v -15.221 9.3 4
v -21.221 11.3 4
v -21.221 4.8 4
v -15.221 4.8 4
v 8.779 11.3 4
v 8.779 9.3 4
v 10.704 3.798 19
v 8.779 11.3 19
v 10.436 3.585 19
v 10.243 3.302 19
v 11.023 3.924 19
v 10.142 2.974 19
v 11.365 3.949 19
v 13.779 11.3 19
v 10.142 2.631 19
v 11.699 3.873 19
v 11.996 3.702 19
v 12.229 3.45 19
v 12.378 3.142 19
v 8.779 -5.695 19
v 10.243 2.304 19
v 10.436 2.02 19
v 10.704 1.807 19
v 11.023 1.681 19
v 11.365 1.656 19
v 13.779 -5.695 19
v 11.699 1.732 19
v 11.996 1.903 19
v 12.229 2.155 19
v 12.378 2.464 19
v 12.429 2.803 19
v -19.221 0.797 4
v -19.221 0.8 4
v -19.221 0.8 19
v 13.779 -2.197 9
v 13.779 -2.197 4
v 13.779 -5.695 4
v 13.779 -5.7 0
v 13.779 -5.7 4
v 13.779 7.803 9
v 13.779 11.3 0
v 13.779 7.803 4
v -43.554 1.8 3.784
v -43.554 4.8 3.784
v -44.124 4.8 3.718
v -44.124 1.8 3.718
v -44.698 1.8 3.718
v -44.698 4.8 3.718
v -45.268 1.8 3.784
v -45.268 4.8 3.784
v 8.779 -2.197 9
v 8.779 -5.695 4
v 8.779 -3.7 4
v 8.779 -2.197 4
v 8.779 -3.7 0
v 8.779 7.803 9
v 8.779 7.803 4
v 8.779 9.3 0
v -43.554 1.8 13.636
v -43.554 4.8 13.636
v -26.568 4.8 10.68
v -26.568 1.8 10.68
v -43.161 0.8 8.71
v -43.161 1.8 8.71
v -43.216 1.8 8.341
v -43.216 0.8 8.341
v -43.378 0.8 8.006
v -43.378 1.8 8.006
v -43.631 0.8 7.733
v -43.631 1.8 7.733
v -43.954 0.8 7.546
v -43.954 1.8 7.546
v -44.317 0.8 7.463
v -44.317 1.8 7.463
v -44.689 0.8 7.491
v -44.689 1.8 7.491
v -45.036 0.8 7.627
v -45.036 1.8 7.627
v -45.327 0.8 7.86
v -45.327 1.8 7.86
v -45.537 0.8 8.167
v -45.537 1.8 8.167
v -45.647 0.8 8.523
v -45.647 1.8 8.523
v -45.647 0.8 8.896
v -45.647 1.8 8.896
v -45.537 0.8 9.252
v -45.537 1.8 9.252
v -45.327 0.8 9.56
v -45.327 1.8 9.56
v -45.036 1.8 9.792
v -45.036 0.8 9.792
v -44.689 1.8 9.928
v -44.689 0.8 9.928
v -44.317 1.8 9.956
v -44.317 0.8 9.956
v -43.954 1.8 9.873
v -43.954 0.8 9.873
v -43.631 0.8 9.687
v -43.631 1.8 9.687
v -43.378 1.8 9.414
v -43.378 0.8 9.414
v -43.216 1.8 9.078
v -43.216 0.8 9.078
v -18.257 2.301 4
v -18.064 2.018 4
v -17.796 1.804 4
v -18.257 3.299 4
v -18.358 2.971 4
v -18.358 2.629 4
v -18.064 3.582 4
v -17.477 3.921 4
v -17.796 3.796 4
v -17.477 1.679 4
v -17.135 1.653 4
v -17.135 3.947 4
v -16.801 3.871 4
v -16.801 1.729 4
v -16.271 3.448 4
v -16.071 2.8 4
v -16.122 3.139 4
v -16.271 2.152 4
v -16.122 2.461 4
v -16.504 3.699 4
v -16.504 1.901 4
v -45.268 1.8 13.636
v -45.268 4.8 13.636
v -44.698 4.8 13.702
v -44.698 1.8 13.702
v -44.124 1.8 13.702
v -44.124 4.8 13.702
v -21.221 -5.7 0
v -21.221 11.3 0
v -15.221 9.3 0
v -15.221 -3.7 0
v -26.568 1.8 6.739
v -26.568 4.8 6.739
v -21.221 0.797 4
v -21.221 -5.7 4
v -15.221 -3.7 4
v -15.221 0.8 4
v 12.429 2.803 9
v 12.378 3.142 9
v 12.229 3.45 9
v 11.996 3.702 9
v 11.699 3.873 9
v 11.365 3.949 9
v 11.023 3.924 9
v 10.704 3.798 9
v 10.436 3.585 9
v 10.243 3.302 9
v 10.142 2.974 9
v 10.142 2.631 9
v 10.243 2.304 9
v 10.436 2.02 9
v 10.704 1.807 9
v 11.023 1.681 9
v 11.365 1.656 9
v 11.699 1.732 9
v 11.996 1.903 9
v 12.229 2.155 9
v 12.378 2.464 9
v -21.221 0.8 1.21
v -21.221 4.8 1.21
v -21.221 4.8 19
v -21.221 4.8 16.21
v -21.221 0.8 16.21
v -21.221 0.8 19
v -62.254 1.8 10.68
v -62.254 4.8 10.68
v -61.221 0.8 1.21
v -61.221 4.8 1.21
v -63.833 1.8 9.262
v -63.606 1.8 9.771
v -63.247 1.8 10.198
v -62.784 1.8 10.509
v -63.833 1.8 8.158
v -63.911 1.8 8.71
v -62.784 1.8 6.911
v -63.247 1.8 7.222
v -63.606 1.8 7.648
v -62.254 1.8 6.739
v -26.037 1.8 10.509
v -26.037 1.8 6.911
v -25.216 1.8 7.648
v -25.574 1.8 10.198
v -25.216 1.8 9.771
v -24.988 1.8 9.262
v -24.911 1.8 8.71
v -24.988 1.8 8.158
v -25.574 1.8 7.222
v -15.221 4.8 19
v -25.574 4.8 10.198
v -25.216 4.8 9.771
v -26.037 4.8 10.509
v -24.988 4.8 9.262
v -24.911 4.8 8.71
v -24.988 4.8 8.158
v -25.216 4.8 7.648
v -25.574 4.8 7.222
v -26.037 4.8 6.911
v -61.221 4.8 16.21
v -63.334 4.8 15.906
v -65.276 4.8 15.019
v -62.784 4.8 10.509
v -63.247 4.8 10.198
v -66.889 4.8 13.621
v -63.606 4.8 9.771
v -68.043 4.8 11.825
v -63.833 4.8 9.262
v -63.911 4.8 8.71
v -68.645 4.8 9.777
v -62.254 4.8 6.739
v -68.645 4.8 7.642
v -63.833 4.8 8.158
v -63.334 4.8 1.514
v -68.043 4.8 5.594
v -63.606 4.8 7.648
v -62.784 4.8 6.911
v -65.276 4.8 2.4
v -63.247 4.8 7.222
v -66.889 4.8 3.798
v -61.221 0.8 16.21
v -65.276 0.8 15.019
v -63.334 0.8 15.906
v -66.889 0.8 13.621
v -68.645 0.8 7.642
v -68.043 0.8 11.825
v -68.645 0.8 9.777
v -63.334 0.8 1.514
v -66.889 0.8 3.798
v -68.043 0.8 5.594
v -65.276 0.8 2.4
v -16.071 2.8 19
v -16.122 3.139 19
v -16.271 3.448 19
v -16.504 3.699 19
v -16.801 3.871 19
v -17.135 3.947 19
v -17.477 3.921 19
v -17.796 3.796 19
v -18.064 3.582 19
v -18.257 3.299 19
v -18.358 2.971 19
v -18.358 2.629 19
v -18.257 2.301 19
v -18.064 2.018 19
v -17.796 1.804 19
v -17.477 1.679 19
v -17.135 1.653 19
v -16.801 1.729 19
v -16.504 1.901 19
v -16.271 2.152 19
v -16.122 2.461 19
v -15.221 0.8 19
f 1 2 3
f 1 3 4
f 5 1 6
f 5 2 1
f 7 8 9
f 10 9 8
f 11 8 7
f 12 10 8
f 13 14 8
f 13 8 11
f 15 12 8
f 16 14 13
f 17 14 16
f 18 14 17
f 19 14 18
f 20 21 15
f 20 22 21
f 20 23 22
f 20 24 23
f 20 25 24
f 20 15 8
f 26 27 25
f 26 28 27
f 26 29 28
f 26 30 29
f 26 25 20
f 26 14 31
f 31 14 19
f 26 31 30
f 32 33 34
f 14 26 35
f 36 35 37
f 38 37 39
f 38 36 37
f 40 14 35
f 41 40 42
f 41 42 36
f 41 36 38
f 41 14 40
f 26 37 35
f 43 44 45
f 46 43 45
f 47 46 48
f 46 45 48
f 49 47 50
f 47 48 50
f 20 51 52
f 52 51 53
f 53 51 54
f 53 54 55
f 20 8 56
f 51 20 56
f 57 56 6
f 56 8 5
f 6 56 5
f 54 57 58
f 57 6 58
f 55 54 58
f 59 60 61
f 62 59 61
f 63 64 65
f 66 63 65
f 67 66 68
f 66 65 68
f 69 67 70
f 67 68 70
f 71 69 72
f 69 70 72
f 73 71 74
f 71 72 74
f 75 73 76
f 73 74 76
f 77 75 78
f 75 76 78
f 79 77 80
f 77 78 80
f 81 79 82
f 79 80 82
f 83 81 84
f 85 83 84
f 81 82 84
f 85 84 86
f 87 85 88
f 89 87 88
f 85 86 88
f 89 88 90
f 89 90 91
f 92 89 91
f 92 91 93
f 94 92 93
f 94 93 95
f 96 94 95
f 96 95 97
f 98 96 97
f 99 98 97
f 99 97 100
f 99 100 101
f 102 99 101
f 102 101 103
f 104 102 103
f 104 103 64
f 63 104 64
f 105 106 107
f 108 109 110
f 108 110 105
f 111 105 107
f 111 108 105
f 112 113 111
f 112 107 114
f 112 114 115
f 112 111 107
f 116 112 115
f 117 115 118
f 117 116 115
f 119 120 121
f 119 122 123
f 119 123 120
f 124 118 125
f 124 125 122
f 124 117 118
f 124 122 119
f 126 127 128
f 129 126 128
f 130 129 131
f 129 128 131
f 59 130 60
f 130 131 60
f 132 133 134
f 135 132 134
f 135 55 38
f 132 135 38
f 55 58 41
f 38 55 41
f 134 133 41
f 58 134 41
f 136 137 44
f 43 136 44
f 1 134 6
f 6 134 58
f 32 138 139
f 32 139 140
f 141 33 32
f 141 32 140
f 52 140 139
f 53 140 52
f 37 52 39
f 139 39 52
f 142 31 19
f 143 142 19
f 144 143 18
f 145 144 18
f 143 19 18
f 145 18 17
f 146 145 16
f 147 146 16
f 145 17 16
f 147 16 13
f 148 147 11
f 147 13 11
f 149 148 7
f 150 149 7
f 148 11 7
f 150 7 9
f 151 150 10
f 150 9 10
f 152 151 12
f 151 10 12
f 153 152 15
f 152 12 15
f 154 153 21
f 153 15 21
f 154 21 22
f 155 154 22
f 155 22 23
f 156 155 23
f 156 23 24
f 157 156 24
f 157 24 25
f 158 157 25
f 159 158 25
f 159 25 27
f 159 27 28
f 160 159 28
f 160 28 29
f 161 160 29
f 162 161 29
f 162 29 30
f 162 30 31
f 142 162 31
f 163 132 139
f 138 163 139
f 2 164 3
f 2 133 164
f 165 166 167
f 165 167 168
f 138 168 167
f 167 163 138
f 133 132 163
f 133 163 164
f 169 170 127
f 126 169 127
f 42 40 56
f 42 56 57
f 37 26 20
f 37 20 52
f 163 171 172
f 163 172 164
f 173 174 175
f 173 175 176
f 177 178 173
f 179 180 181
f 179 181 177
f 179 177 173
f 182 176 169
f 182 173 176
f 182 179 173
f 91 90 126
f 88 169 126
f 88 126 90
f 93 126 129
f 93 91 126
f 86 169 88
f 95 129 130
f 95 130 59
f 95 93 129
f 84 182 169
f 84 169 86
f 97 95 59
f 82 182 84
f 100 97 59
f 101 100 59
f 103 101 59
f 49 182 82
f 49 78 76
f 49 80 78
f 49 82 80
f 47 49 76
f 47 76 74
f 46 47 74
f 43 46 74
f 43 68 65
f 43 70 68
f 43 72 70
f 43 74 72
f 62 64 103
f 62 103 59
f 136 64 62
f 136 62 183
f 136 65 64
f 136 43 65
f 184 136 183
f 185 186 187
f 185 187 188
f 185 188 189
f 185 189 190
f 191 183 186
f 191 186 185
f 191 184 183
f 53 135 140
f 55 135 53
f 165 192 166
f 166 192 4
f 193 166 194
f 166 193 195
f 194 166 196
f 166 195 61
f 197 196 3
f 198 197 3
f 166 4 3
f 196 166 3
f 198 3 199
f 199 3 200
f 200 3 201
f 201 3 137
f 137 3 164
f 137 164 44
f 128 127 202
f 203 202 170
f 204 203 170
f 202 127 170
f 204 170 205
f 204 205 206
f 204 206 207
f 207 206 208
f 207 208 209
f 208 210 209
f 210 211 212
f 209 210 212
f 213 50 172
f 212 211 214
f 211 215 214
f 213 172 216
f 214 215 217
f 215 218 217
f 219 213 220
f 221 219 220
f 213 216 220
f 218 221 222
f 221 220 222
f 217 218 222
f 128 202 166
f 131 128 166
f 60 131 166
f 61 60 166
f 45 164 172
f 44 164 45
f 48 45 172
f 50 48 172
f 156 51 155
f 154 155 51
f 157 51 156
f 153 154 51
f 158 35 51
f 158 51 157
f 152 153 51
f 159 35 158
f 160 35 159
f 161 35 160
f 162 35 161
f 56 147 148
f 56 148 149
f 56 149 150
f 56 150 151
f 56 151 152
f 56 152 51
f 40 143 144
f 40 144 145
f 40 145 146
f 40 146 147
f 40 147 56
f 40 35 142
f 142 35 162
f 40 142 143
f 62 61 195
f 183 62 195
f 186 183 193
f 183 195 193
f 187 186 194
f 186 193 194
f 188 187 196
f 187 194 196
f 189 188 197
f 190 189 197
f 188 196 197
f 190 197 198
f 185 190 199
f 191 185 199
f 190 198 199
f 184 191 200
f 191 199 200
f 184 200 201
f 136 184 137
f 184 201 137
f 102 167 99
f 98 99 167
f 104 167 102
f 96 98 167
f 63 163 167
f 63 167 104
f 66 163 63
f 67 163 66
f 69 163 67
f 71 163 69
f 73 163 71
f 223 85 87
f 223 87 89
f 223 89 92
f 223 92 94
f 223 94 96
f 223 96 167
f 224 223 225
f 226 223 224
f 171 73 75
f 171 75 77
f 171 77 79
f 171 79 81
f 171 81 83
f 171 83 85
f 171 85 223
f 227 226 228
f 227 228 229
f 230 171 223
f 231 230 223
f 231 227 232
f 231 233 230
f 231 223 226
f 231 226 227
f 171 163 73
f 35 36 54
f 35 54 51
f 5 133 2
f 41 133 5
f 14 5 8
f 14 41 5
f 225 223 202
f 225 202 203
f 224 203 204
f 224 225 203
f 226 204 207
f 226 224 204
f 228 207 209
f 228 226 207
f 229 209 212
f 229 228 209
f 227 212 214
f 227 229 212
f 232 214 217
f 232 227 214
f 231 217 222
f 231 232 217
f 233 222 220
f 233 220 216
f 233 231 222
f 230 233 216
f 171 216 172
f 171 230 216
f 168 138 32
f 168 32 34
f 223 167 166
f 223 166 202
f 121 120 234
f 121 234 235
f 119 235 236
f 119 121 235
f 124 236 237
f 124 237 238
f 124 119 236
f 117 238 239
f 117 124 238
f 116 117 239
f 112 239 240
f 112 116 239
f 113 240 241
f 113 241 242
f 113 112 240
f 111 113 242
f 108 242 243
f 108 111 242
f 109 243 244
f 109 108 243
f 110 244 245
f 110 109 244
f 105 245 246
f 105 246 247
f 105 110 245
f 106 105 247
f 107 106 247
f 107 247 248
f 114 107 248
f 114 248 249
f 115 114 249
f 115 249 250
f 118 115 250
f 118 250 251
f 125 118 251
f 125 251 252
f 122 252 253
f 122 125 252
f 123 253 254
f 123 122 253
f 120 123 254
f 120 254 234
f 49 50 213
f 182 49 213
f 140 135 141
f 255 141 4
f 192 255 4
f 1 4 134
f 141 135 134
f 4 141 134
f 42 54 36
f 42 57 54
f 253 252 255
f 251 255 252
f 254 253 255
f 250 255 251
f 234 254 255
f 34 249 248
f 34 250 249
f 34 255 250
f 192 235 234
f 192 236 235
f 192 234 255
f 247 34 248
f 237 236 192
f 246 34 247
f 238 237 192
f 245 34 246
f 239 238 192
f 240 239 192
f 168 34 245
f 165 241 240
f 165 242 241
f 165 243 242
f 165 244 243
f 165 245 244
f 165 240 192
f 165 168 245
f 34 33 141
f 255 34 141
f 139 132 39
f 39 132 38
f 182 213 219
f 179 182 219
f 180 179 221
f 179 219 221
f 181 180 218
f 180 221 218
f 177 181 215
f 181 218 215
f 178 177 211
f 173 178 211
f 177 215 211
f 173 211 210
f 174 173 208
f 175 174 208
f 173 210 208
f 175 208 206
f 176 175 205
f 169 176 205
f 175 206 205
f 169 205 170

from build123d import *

# Parameters (mm, degrees)
SKETCH_1_W          = 35
SKETCH_1_H          = 17
EXTRUDE_1_DEPTH     = 4
SKETCH_2_W          = 24
SKETCH_2_H          = 13
CUT_EXTRUDE_1_DEPTH = 6
EXTRUDE_2_DEPTH     = 5
SKETCH_5_W          = 4
SKETCH_5_H          = 4
SKETCH_5_R          = 1.15
EXTRUDE_3_DEPTH     = 15
SKETCH_6_R          = 1.15
CUT_EXTRUDE_2_DEPTH = 15
EXTRUDE_5_DEPTH     = 2
EXTRUDE_6_DEPTH     = 4
CUT_EXTRUDE_3_DEPTH = 3
SKETCH_11_R         = 1.25
CUT_EXTRUDE_4_DEPTH = 13.4


with BuildPart() as part:
    # 草圖1 → 填料-伸長1 (new body)
    with BuildSketch(Plane.XY):
        with Locations((-3.721052632, 2.8)):
            Rectangle(SKETCH_1_W, SKETCH_1_H)
    extrude(amount=EXTRUDE_1_DEPTH)

    # 草圖2 → 除料-伸長1 (cut)
    with BuildSketch(Plane.XY):
        with Locations((-3.221052632, 2.8)):
            Rectangle(SKETCH_2_W, SKETCH_2_H)
    extrude(amount=CUT_EXTRUDE_1_DEPTH, mode=Mode.SUBTRACT)

    # 草圖3 → 填料-伸長2 (add)
    with BuildSketch(Plane(origin=(13.778947368, 0, 0), x_dir=(0, 0, -1), z_dir=(1, 0, 0))):
        Polygon((-4, 7.802538439), (-4, 11.3), (-19, 11.3), (-19, -5.694923122), (-4, -5.694923122), (-4, -2.197461561), (-9, -2.197461561), (-9, 7.802538439), align=None)
    extrude(amount=-EXTRUDE_2_DEPTH)

    # 草圖5 → 填料-伸長3 (add)
    with BuildSketch(Plane.XY.offset(4)):
        with Locations((-17.221052632, 2.8)):
            Rectangle(SKETCH_5_W, SKETCH_5_H)
        with Locations((-17.221052632, 2.8)):
            Circle(SKETCH_5_R, mode=Mode.SUBTRACT)
    extrude(amount=EXTRUDE_3_DEPTH)

    # 草圖6 → 除料-伸長2 (cut)
    with BuildSketch(Plane.XY.offset(19)):
        with Locations((11.278947368, 2.802538439)):
            Circle(SKETCH_6_R)
    extrude(amount=-CUT_EXTRUDE_2_DEPTH, mode=Mode.SUBTRACT)

    # 草圖7 → 填料-伸長5 (add)
    with BuildSketch(Plane.ZY.offset(21.221052632)):
        Polygon((4, 4.8), (4, 0.796544916), (19, 0.8), (19, 4.8), align=None)
    extrude(amount=-EXTRUDE_5_DEPTH)

    # 草圖9 → 填料-伸長6 (add)
    with BuildSketch(Plane(origin=(0, 0.8, 0), x_dir=(-1, 0, 0), z_dir=(0, -1, 0))):
        with BuildLine():
            Line((21.221052632, -1.209797885), (21.221052632, -16.209797885))
            Line((21.221052632, -16.209797885), (61.221052632, -16.209797885))
            ThreePointArc((61.221052632, -16.209797885), (68.721052632, -8.709797885), (61.221052632, -1.209797885))
            Line((61.221052632, -1.209797885), (21.221052632, -1.209797885))
        make_face()
    extrude(amount=-EXTRUDE_6_DEPTH)

    # 草圖10 → 除料-伸長3 (cut)
    with BuildSketch(Plane(origin=(0, 4.8, 0), x_dir=(1, 0, 0), z_dir=(0, 1, 0))):
        with BuildLine():
            Line((-45.267861932, -3.783815128), (-62.253576218, -6.739404782))
            ThreePointArc((-62.253576218, -6.739404782), (-63.910719075, -8.709797885), (-62.253576218, -10.680190988))
            Line((-62.253576218, -10.680190988), (-45.267861932, -13.635780642))
            ThreePointArc((-45.267861932, -13.635780642), (-44.410719075, -13.709797885), (-43.553576218, -13.635780642))
            Line((-43.553576218, -13.635780642), (-26.567861932, -10.680190988))
            ThreePointArc((-26.567861932, -10.680190988), (-24.910719075, -8.709797885), (-26.567861932, -6.739404782))
            Line((-26.567861932, -6.739404782), (-43.553576218, -3.783815128))
            ThreePointArc((-43.553576218, -3.783815128), (-44.410719075, -3.709797885), (-45.267861932, -3.783815128))
        make_face()
    extrude(amount=-CUT_EXTRUDE_3_DEPTH, mode=Mode.SUBTRACT)

    # 草圖11 → 除料-伸長4 (cut)
    with BuildSketch(Plane(origin=(0, 4.8, 0), x_dir=(1, 0, 0), z_dir=(0, 1, 0))):
        with Locations((-44.410719075, -8.709797885)):
            Circle(SKETCH_11_R)
    extrude(amount=-CUT_EXTRUDE_4_DEPTH, mode=Mode.SUBTRACT)


solid = part.part
